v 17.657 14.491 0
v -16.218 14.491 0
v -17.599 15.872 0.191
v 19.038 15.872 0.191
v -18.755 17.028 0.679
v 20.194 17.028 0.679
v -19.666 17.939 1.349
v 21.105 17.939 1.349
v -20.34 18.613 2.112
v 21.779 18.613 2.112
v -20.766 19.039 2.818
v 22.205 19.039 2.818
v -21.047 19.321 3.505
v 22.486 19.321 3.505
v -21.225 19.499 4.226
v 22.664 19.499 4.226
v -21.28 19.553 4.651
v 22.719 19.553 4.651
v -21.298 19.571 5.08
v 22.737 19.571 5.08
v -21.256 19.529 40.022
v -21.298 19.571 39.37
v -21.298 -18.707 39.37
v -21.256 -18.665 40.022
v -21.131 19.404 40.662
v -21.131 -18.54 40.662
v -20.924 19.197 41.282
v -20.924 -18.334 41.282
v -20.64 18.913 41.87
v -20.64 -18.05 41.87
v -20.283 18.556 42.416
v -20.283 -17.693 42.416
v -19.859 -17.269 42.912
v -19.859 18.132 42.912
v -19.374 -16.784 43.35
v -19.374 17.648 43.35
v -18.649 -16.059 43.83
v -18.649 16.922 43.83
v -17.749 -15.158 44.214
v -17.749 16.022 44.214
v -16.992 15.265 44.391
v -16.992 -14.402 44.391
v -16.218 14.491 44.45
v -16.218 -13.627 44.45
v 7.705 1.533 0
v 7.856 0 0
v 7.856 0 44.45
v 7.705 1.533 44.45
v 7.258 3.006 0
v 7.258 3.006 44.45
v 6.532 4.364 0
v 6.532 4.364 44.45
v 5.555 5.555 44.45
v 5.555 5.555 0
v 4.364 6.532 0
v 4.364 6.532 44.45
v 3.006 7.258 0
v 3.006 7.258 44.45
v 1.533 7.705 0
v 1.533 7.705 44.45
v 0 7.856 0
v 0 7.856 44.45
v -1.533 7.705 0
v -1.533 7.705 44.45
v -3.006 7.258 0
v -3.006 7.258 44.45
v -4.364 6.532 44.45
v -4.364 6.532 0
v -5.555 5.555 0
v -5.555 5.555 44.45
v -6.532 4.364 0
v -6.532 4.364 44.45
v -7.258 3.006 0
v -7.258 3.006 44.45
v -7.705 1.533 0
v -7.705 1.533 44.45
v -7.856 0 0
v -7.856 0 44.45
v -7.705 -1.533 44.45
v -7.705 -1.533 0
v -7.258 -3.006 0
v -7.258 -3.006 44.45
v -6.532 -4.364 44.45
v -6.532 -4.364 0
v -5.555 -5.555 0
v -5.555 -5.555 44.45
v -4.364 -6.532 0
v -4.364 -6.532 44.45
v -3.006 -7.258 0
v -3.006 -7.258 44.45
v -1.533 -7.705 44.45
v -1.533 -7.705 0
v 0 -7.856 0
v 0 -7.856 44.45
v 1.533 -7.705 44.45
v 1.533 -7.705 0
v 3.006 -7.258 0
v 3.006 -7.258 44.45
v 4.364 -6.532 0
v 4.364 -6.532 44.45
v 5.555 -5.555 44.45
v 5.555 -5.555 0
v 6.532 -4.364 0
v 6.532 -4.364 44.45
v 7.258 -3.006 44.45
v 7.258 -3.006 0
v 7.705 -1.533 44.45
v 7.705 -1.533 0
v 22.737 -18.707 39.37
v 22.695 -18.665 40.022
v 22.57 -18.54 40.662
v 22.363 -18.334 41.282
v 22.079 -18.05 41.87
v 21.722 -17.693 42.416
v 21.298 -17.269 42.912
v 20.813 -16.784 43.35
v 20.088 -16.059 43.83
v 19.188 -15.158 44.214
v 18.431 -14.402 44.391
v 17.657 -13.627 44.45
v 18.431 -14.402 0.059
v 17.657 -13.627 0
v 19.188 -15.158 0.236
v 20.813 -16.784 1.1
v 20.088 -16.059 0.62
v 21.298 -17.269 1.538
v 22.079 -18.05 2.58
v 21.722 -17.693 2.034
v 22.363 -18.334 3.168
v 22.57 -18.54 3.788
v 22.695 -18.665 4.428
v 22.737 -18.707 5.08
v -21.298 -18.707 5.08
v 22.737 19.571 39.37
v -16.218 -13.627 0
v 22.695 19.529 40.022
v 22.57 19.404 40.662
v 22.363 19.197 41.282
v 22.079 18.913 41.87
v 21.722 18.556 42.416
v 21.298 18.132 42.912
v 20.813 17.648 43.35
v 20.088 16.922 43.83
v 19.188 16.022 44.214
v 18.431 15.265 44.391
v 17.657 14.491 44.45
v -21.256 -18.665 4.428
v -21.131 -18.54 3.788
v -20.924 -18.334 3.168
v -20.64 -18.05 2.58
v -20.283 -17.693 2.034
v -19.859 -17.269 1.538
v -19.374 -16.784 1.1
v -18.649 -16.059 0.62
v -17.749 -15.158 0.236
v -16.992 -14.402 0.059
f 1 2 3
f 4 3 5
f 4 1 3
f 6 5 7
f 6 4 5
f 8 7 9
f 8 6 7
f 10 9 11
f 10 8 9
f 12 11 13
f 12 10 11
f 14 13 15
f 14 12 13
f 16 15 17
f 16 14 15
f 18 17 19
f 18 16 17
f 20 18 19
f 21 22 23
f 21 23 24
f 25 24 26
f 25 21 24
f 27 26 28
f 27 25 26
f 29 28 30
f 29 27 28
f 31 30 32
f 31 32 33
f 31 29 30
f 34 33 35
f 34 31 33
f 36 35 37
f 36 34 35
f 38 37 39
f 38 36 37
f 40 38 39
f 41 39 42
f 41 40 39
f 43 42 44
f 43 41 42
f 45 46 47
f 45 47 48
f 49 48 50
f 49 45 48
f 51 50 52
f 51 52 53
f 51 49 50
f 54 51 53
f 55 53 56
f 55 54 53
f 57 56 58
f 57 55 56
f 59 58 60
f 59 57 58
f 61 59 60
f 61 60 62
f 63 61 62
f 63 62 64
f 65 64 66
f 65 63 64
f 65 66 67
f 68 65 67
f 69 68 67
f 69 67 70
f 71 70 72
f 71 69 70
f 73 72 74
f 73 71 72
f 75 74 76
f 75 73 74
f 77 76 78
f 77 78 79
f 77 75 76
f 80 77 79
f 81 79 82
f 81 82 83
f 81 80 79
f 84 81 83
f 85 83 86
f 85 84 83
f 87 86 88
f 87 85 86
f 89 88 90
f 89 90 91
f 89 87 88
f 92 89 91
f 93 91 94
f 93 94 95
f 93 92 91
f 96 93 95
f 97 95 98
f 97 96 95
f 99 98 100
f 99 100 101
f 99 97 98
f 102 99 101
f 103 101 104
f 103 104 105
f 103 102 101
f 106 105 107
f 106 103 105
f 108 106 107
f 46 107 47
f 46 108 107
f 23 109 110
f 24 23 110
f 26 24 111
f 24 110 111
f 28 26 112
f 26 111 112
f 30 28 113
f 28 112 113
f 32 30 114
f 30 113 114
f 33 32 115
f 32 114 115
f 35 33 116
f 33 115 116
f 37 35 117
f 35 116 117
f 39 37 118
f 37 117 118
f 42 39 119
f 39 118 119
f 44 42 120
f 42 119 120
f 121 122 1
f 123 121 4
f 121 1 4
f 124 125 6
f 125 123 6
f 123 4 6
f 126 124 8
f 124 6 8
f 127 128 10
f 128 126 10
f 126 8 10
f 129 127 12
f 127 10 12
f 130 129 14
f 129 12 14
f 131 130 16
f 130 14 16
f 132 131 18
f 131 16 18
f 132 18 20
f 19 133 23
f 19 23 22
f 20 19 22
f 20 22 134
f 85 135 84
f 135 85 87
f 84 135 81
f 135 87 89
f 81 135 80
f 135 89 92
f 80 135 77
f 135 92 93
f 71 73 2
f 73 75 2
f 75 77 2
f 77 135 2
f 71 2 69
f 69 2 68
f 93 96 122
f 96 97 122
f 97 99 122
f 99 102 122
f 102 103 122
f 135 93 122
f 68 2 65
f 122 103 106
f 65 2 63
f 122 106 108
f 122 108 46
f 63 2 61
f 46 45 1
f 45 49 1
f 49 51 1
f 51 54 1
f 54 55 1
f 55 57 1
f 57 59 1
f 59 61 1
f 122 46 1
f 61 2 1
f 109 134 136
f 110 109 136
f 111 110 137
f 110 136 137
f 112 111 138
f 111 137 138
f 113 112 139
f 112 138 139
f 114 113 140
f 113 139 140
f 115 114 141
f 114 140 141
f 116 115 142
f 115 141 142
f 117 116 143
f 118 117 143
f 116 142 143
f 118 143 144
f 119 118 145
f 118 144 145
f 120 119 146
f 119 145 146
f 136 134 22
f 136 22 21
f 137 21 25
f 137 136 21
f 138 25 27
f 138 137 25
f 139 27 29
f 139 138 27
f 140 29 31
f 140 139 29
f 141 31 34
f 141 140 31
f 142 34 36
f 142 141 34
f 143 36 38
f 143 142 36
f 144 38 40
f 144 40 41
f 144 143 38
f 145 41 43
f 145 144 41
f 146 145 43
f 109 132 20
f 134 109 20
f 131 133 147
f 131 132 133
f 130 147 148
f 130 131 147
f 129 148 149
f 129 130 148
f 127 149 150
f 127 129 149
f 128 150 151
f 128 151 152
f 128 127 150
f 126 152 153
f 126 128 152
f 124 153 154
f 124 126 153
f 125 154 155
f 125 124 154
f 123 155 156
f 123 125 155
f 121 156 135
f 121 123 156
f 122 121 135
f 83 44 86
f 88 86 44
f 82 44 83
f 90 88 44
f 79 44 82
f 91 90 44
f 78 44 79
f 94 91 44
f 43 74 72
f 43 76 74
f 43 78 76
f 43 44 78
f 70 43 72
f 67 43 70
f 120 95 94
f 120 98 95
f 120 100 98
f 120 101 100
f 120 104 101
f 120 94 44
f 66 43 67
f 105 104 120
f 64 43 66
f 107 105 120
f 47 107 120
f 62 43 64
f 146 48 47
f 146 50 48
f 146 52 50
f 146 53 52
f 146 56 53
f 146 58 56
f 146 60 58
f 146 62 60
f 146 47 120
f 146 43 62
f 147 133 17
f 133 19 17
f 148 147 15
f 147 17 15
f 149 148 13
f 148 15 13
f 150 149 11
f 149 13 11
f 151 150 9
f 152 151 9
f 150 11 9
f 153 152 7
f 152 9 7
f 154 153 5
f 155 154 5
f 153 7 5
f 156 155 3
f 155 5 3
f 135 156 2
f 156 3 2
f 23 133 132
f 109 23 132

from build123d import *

# Parameters (mm, degrees)
F0_W     = 44.034278
F0_H     = 38.278166
F0_R     = 7.855569
F1_DEPTH = 44.45
F2_R     = 5.08
F3_R     = 5.08


with BuildPart() as f1:
    # F0 (on Top) → F1 (new body)
    with BuildSketch(Plane.XY):
        with Locations((0.719513, 0.431709)):
            Rectangle(F0_W, F0_H)
        Circle(F0_R, mode=Mode.SUBTRACT)
    extrude(amount=F1_DEPTH)

    # F2
    f2_edges = [f1.edges().sort_by_distance(p)[0] for p in [
        (0.719513, -18.707374, 44.45),
        (22.736652, 0.431709, 44.45),
        (0.719513, 19.570792, 44.45),
        (-21.297626, 0.431709, 44.45),
    ]]
    fillet(f2_edges, radius=F2_R)

    # F3
    f3_edges = [f1.edges().sort_by_distance(p)[0] for p in [
        (0.719513, 19.570792, 0),
        (-21.297626, 0.431709, 0),
        (0.719513, -18.707374, 0),
        (22.736652, 0.431709, 0),
    ]]
    fillet(f3_edges, radius=F3_R)


solid = f1.part
